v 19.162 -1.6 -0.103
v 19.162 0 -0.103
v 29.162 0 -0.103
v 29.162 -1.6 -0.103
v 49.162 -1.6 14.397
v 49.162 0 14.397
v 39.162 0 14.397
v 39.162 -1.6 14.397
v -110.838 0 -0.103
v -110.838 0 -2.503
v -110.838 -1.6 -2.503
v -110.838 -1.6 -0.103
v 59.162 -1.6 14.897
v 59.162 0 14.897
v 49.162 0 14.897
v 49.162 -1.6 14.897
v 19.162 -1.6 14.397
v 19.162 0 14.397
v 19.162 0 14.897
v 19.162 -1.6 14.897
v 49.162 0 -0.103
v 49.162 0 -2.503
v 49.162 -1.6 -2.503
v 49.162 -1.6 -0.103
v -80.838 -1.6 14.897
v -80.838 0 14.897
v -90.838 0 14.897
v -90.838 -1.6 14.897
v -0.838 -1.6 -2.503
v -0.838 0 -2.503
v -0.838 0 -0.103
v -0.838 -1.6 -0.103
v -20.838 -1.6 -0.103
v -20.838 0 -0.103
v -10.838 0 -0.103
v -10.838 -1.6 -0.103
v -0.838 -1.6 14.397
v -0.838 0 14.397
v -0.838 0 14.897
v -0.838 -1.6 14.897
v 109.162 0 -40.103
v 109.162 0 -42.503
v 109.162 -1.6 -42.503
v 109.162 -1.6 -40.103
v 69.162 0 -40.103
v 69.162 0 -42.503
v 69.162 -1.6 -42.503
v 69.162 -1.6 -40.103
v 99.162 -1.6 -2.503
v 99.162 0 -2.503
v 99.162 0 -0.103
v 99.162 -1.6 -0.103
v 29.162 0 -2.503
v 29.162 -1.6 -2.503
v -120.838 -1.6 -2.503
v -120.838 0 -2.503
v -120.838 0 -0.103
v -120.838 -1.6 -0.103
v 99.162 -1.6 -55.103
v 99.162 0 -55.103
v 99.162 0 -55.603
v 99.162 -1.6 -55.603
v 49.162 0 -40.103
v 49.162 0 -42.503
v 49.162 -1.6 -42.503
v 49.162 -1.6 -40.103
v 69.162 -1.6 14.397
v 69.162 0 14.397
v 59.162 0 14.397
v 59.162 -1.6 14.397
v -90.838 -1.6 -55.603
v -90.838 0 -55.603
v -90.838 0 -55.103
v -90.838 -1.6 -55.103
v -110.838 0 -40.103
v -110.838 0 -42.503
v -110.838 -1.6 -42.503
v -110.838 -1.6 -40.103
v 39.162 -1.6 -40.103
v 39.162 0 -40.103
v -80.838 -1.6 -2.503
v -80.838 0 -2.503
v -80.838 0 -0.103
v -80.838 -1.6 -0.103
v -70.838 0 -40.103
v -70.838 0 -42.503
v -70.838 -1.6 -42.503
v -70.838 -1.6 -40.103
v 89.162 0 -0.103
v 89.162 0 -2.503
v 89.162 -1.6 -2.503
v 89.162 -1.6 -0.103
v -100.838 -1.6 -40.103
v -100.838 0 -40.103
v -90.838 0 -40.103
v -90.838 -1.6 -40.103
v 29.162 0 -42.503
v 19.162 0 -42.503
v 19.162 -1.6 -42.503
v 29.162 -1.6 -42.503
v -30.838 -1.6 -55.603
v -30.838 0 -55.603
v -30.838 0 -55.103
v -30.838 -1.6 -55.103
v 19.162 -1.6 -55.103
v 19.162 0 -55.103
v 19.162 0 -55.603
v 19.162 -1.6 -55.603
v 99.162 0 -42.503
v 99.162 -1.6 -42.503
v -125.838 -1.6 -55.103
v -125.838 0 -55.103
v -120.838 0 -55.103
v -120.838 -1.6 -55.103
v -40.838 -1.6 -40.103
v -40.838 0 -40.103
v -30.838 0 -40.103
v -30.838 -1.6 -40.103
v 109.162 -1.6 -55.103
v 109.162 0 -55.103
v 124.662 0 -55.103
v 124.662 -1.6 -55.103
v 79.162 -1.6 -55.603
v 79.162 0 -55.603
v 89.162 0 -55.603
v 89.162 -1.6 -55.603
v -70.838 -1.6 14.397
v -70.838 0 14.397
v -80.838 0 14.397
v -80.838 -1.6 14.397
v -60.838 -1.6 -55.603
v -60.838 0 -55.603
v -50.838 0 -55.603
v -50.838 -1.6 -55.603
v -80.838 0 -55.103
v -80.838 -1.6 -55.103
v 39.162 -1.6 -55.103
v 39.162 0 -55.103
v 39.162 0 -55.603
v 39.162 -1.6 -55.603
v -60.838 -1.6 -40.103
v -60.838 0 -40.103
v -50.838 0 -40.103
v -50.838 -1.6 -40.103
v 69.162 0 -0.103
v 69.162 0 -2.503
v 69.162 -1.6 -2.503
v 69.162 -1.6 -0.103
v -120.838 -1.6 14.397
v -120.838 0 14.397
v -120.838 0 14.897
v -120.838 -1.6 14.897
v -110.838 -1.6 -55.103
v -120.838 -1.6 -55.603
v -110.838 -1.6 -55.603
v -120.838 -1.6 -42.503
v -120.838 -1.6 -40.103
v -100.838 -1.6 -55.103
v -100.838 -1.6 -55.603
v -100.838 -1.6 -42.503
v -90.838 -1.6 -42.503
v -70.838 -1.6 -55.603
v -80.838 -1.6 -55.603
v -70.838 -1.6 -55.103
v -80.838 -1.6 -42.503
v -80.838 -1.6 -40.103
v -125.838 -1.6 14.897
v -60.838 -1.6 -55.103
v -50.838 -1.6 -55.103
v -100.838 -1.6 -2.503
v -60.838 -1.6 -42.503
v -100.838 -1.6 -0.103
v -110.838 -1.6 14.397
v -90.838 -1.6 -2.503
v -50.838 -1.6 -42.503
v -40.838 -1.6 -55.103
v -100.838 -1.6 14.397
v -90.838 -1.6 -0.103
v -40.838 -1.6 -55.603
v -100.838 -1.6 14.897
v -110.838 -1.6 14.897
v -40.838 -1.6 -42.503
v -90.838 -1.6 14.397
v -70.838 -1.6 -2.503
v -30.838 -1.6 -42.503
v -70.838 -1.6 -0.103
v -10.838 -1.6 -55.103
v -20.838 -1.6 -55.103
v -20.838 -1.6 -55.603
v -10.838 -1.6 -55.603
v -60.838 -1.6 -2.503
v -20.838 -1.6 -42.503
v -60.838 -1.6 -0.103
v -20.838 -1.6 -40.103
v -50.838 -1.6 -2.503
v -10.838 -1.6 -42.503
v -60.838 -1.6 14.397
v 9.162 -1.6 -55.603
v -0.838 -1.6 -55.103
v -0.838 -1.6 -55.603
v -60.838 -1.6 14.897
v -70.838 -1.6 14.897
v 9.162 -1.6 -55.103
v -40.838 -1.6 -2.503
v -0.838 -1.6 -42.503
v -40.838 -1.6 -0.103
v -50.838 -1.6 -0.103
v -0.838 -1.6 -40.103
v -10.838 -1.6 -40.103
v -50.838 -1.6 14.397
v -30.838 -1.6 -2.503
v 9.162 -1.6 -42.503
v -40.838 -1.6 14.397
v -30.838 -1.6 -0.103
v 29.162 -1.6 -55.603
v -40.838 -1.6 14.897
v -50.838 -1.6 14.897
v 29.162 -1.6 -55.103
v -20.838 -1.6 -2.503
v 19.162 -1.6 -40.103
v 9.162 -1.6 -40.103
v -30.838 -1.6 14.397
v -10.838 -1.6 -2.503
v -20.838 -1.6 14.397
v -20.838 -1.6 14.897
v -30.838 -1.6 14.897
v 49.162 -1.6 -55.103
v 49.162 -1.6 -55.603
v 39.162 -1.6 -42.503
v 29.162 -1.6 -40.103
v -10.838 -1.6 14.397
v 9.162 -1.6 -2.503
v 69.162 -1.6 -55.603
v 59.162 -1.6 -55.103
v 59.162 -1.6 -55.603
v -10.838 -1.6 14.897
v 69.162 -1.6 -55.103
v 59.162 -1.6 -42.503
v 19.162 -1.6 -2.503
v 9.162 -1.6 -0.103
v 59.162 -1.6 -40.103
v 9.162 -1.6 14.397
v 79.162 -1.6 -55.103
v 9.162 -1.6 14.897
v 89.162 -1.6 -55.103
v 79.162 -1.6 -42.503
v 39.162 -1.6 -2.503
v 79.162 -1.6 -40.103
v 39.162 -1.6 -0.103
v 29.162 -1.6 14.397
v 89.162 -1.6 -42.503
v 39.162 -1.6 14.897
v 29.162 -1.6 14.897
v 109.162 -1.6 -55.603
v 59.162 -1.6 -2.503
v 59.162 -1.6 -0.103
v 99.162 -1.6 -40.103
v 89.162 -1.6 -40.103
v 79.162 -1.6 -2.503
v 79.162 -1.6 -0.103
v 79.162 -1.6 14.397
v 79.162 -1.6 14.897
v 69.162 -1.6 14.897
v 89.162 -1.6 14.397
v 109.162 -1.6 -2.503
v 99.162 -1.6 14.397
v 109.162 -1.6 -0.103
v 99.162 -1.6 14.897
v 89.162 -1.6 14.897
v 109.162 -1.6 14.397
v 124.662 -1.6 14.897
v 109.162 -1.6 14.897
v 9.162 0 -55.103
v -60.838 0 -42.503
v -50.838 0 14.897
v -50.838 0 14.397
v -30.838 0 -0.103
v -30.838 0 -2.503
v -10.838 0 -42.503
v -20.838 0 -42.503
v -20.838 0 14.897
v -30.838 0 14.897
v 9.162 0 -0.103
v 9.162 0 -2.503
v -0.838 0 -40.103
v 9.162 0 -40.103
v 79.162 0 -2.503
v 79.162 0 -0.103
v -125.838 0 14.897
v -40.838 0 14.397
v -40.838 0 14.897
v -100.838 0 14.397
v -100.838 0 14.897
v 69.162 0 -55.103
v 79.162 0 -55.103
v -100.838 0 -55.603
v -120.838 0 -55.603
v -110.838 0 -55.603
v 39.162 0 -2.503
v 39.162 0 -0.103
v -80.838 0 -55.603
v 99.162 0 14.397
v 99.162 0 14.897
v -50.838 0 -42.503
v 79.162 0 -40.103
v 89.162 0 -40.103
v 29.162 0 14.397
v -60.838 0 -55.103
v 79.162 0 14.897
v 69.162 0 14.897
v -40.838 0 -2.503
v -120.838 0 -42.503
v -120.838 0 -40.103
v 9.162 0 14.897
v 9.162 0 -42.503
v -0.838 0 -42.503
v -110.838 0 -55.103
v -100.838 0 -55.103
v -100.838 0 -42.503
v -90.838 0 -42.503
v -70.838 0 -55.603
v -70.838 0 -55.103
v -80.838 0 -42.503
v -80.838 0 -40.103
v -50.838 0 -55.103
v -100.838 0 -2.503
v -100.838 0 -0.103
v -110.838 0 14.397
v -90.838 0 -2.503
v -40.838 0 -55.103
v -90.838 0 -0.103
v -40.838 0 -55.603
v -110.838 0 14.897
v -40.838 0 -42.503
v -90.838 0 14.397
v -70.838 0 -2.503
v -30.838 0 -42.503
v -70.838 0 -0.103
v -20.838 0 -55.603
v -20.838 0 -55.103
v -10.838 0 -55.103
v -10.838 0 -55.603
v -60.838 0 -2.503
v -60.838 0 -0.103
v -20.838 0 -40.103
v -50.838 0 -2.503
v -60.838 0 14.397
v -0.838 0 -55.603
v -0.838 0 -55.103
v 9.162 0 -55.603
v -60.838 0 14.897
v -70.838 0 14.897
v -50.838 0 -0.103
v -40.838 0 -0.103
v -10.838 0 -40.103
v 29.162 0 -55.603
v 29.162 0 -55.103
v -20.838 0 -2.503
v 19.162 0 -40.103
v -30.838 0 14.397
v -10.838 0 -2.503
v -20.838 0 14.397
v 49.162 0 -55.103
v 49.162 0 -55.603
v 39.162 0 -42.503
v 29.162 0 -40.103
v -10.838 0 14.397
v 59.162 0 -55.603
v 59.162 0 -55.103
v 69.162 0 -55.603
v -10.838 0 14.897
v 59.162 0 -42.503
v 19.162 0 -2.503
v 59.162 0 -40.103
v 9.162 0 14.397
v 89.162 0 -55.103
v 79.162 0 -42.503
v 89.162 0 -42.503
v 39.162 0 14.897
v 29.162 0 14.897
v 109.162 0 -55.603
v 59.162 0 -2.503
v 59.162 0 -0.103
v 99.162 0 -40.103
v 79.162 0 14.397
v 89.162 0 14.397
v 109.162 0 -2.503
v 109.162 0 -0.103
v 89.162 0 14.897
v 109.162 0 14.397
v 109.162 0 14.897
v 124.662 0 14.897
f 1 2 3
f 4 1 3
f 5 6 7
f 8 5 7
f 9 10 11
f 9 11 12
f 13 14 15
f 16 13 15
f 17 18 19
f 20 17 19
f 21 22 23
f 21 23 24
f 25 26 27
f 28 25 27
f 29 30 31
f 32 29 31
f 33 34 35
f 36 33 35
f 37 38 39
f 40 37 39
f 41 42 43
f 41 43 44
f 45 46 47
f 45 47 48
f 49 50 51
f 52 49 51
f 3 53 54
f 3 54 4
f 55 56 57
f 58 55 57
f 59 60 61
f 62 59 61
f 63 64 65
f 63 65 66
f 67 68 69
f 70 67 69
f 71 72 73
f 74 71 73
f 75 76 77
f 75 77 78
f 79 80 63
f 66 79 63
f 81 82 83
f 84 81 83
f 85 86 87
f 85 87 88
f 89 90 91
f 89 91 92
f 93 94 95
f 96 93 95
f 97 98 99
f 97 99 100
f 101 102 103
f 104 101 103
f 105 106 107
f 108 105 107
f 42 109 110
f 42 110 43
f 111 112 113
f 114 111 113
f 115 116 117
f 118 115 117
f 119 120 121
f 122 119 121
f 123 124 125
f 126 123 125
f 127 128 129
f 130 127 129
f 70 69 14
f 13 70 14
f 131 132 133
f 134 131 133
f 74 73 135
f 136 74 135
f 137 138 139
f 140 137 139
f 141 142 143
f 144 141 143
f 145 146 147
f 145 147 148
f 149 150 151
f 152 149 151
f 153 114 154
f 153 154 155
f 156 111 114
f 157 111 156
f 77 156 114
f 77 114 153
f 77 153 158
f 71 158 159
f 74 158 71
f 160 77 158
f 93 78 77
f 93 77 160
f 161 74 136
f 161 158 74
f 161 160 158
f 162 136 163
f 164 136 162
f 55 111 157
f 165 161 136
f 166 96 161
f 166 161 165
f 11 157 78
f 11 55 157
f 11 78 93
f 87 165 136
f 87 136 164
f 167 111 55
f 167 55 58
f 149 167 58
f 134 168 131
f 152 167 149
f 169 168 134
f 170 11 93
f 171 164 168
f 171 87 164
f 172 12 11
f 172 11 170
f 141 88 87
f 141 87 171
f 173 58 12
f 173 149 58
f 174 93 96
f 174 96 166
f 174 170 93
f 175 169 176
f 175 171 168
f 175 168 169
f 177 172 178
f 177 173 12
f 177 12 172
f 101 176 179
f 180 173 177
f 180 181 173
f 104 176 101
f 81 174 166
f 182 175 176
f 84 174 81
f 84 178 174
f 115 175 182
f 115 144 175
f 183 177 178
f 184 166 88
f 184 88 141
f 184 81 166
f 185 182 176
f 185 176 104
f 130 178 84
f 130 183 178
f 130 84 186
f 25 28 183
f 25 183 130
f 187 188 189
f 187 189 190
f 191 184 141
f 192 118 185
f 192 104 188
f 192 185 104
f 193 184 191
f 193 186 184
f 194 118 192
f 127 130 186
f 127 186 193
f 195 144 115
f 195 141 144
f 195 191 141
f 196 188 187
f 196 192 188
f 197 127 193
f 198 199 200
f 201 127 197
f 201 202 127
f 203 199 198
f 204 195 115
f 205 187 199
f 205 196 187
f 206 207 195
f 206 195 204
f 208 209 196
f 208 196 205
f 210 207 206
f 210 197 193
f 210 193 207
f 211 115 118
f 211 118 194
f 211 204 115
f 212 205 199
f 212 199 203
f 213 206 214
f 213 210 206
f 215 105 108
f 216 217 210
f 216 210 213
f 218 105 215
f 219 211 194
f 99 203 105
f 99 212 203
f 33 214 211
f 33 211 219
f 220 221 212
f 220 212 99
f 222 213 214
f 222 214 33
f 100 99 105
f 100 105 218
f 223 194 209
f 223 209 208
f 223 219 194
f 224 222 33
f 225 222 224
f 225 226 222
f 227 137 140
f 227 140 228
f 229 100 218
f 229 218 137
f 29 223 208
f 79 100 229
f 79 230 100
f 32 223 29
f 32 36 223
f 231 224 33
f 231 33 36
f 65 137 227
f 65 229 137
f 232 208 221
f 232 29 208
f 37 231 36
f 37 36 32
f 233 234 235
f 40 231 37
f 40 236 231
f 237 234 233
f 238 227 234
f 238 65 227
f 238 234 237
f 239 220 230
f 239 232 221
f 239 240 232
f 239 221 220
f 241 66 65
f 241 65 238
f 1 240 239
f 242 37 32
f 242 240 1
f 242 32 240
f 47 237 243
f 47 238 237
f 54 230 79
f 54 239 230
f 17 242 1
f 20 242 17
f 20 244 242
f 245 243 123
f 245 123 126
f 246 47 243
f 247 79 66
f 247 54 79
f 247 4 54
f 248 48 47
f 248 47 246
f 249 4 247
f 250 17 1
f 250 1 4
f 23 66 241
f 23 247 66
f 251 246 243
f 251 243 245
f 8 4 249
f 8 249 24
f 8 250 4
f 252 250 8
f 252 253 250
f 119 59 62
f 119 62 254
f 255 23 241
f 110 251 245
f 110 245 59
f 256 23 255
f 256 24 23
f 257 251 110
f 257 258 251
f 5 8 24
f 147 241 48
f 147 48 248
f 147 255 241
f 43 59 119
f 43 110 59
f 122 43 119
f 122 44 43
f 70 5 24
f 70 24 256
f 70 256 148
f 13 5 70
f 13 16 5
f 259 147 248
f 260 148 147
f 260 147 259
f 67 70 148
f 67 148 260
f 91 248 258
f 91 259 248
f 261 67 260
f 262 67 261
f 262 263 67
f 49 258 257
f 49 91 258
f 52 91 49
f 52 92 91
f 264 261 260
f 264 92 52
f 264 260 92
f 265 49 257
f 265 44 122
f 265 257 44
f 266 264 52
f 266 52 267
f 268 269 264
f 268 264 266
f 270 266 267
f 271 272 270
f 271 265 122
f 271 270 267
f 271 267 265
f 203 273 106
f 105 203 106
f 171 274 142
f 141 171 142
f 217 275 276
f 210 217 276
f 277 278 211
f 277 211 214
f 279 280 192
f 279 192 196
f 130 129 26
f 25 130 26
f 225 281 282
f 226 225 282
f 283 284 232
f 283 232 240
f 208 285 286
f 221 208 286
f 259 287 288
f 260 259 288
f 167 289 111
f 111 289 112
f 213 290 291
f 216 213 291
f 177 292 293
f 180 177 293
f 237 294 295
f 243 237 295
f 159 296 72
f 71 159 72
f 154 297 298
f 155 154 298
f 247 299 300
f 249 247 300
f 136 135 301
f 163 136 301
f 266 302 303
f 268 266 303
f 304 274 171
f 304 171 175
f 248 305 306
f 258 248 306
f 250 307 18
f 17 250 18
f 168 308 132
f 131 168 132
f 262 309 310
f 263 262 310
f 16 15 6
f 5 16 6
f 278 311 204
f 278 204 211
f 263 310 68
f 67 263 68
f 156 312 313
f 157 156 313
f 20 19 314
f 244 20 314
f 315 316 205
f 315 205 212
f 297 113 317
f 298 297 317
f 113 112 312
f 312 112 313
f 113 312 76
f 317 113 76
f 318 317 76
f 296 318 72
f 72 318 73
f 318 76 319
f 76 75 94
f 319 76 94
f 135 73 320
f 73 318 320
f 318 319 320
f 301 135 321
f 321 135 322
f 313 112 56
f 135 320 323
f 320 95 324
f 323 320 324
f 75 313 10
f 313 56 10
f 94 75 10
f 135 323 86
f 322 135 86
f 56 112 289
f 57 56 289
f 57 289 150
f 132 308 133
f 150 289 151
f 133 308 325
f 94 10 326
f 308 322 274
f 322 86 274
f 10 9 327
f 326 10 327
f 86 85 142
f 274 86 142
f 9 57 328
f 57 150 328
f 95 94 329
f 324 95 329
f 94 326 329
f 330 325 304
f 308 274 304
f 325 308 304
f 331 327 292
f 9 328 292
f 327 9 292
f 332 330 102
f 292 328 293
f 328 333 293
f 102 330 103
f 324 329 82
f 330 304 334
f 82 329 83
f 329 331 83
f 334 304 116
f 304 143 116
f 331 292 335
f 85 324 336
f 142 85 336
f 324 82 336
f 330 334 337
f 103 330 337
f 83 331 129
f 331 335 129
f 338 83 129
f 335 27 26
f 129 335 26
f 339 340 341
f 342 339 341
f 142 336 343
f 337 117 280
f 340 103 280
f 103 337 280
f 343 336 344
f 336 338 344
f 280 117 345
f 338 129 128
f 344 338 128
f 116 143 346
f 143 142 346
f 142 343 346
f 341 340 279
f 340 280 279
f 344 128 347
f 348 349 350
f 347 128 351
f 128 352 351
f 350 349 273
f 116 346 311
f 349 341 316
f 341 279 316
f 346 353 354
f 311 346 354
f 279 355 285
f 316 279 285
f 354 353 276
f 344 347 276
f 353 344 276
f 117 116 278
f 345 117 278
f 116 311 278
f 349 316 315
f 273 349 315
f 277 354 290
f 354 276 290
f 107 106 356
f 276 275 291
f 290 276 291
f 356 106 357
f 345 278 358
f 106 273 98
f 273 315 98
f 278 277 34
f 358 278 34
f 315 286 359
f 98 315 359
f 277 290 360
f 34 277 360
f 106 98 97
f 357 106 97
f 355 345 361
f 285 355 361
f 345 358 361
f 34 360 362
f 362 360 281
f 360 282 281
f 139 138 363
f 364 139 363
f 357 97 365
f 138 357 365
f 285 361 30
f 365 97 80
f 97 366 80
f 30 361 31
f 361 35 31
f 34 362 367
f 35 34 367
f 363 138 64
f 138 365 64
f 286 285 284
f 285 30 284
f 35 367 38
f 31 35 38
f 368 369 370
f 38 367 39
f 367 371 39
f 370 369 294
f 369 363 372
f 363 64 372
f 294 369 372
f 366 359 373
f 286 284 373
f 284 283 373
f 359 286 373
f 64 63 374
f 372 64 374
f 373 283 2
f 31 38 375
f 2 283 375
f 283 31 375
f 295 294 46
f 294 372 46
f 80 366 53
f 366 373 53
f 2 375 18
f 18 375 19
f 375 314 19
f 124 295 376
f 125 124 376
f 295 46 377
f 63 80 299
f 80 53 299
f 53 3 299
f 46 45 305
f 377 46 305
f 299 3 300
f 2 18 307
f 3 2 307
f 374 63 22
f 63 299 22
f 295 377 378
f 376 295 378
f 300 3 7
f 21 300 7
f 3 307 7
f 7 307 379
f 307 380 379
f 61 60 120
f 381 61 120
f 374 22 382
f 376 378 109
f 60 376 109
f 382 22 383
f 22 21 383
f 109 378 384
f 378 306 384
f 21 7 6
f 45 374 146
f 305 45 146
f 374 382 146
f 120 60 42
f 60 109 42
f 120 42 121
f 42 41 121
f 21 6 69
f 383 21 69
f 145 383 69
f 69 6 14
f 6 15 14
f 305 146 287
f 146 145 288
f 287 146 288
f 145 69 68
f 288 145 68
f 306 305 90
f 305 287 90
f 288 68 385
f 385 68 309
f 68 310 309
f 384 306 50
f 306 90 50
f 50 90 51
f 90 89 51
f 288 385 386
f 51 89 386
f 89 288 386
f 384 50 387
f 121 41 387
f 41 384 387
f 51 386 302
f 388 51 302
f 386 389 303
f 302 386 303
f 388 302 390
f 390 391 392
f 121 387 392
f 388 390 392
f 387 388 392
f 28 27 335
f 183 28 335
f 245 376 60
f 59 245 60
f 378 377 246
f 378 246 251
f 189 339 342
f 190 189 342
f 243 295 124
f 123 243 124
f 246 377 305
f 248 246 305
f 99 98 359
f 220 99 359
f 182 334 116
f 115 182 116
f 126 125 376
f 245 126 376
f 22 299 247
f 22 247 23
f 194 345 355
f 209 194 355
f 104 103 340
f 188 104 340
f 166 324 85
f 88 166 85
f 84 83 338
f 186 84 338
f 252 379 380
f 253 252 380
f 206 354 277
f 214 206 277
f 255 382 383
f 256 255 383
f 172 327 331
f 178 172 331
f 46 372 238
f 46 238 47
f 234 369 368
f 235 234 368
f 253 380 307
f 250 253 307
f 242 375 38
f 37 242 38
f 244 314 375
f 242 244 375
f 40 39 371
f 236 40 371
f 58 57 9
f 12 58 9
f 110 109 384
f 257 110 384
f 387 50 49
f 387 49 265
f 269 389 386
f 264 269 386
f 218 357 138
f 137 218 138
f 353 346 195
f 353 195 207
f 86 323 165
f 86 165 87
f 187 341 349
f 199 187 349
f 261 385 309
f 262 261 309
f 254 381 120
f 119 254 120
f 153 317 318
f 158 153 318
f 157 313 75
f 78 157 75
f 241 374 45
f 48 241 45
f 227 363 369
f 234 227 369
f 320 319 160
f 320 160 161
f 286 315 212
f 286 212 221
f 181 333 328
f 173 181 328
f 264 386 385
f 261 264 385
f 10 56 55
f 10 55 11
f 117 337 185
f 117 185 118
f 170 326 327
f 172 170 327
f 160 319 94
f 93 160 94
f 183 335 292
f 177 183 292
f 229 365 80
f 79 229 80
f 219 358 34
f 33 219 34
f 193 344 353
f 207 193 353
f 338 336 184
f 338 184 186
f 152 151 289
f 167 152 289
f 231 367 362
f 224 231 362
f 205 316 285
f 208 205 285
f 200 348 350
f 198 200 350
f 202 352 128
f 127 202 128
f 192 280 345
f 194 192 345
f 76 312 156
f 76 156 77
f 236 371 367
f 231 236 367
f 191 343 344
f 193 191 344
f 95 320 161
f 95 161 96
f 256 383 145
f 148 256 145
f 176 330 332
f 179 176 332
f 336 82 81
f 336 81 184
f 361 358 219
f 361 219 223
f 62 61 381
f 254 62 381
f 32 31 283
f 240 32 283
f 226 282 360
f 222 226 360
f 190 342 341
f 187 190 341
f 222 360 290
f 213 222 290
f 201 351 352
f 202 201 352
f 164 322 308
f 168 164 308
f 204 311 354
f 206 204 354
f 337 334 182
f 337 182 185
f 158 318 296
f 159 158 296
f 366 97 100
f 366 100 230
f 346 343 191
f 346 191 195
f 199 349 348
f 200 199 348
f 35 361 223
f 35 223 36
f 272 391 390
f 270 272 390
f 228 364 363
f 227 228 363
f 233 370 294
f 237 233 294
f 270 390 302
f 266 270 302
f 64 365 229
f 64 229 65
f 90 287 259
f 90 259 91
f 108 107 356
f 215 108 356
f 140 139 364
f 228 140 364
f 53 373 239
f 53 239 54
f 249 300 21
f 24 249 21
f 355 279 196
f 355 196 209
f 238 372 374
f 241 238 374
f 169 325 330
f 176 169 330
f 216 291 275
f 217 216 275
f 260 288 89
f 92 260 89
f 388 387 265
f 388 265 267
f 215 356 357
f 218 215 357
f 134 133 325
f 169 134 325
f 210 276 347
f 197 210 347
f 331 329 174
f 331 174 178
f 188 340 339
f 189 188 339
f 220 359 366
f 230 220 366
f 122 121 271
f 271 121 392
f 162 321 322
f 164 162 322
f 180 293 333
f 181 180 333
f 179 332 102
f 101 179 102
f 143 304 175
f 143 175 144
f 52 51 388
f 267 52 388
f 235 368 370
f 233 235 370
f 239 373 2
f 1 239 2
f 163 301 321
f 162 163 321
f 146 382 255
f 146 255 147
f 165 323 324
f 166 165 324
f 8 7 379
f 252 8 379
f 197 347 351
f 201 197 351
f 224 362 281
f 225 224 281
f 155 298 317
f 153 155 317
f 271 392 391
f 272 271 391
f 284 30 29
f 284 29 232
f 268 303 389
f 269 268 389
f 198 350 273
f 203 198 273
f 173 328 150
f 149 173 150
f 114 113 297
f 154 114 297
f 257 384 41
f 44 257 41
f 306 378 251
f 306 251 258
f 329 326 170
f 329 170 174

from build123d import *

# Parameters (mm, degrees)
F0_W     = 10
F0_H     = 2.4
F1_DEPTH = 1.6


with BuildPart() as f1:
    # F0 (on Front) → F1 (new body)
    with BuildSketch(Plane.XZ):
        Polygon((-125.837884, 14.897037), (-125.837884, -55.102963), (-120.837884, -55.102963), (-120.837884, -55.602963), (-110.837884, -55.602963), (-110.837884, -55.102963), (-100.837884, -55.102963), (-100.837884, -55.602963), (-90.837884, -55.602963), (-90.837884, -55.102963), (-80.837884, -55.102963), (-80.837884, -55.602963), (-70.837884, -55.602963), (-70.837884, -55.102963), (-60.837884, -55.102963), (-60.837884, -55.602963), (-50.837884, -55.602963), (-50.837884, -55.102963), (-40.837884, -55.102963), (-40.837884, -55.602963), (-30.837884, -55.602963), (-30.837884, -55.102963), (-20.837884, -55.102963), (-20.837884, -55.602963), (-10.837884, -55.602963), (-10.837884, -55.102963), (-0.837884, -55.102963), (-0.837884, -55.602963), (9.162116, -55.602963), (9.162116, -55.102963), (19.162116, -55.102963), (19.162116, -55.602963), (29.162116, -55.602963), (29.162116, -55.102963), (39.162116, -55.102963), (39.162116, -55.602963), (49.162116, -55.602963), (49.162116, -55.102963), (59.162116, -55.102963), (59.162116, -55.602963), (69.162116, -55.602963), (69.162116, -55.102963), (79.162116, -55.102963), (79.162116, -55.602963), (89.162116, -55.602963), (89.162116, -55.102963), (99.162116, -55.102963), (99.162116, -55.602963), (109.162116, -55.602963), (109.162116, -55.102963), (124.662116, -55.102963), (124.662116, 14.897037), (119.162116, 14.897037), (109.162116, 14.897037), (109.162116, 14.397037), (99.162116, 14.397037), (99.162116, 14.897037), (89.162116, 14.897037), (89.162116, 14.397037), (79.162116, 14.397037), (79.162116, 14.897037), (69.162116, 14.897037), (69.162116, 14.397037), (59.162116, 14.397037), (59.162116, 14.897037), (49.162116, 14.897037), (49.162116, 14.397037), (39.162116, 14.397037), (39.162116, 14.897037), (29.162116, 14.897037), (29.162116, 14.397037), (19.162116, 14.397037), (19.162116, 14.897037), (9.162116, 14.897037), (9.162116, 14.397037), (-0.837884, 14.397037), (-0.837884, 14.897037), (-10.837884, 14.897037), (-10.837884, 14.397037), (-20.837884, 14.397037), (-20.837884, 14.897037), (-30.837884, 14.897037), (-30.837884, 14.397037), (-40.837884, 14.397037), (-40.837884, 14.897037), (-50.837884, 14.897037), (-50.837884, 14.397037), (-60.837884, 14.397037), (-60.837884, 14.897037), (-70.837884, 14.897037), (-70.837884, 14.397037), (-80.837884, 14.397037), (-80.837884, 14.897037), (-90.837884, 14.897037), (-90.837884, 14.397037), (-100.837884, 14.397037), (-100.837884, 14.897037), (-110.837884, 14.897037), (-110.837884, 14.397037), (-120.837884, 14.397037), (-120.837884, 14.897037), align=None)
        with Locations((-115.837884, -41.302963)):
            Rectangle(F0_W, F0_H, mode=Mode.SUBTRACT)
        with Locations((-95.837884, -41.302963)):
            Rectangle(F0_W, F0_H, mode=Mode.SUBTRACT)
        with Locations((-75.837884, -41.302963)):
            Rectangle(F0_W, F0_H, mode=Mode.SUBTRACT)
        with Locations((-55.837884, -41.302963)):
            Rectangle(F0_W, F0_H, mode=Mode.SUBTRACT)
        with Locations((-35.837884, -41.302963)):
            Rectangle(F0_W, F0_H, mode=Mode.SUBTRACT)
        with Locations((-15.837884, -41.302963)):
            Rectangle(F0_W, F0_H, mode=Mode.SUBTRACT)
        with Locations((4.162116, -41.302963)):
            Rectangle(F0_W, F0_H, mode=Mode.SUBTRACT)
        with Locations((24.162116, -41.302963)):
            Rectangle(F0_W, F0_H, mode=Mode.SUBTRACT)
        with Locations((44.162116, -41.302963)):
            Rectangle(F0_W, F0_H, mode=Mode.SUBTRACT)
        with Locations((64.162116, -41.302963)):
            Rectangle(F0_W, F0_H, mode=Mode.SUBTRACT)
        with Locations((84.162116, -41.302963)):
            Rectangle(F0_W, F0_H, mode=Mode.SUBTRACT)
        with Locations((104.162116, -41.302963)):
            Rectangle(F0_W, F0_H, mode=Mode.SUBTRACT)
        with Locations((-115.837884, -1.302963)):
            Rectangle(F0_W, F0_H, mode=Mode.SUBTRACT)
        with Locations((-95.837884, -1.302963)):
            Rectangle(F0_W, F0_H, mode=Mode.SUBTRACT)
        with Locations((-75.837884, -1.302963)):
            Rectangle(F0_W, F0_H, mode=Mode.SUBTRACT)
        with Locations((-55.837884, -1.302963)):
            Rectangle(F0_W, F0_H, mode=Mode.SUBTRACT)
        with Locations((-35.837884, -1.302963)):
            Rectangle(F0_W, F0_H, mode=Mode.SUBTRACT)
        with Locations((-15.837884, -1.302963)):
            Rectangle(F0_W, F0_H, mode=Mode.SUBTRACT)
        with Locations((4.162116, -1.302963)):
            Rectangle(F0_W, F0_H, mode=Mode.SUBTRACT)
        with Locations((24.162116, -1.302963)):
            Rectangle(F0_W, F0_H, mode=Mode.SUBTRACT)
        with Locations((44.162116, -1.302963)):
            Rectangle(F0_W, F0_H, mode=Mode.SUBTRACT)
        with Locations((64.162116, -1.302963)):
            Rectangle(F0_W, F0_H, mode=Mode.SUBTRACT)
        with Locations((84.162116, -1.302963)):
            Rectangle(F0_W, F0_H, mode=Mode.SUBTRACT)
        with Locations((104.162116, -1.302963)):
            Rectangle(F0_W, F0_H, mode=Mode.SUBTRACT)
    extrude(amount=F1_DEPTH)


solid = f1.part
